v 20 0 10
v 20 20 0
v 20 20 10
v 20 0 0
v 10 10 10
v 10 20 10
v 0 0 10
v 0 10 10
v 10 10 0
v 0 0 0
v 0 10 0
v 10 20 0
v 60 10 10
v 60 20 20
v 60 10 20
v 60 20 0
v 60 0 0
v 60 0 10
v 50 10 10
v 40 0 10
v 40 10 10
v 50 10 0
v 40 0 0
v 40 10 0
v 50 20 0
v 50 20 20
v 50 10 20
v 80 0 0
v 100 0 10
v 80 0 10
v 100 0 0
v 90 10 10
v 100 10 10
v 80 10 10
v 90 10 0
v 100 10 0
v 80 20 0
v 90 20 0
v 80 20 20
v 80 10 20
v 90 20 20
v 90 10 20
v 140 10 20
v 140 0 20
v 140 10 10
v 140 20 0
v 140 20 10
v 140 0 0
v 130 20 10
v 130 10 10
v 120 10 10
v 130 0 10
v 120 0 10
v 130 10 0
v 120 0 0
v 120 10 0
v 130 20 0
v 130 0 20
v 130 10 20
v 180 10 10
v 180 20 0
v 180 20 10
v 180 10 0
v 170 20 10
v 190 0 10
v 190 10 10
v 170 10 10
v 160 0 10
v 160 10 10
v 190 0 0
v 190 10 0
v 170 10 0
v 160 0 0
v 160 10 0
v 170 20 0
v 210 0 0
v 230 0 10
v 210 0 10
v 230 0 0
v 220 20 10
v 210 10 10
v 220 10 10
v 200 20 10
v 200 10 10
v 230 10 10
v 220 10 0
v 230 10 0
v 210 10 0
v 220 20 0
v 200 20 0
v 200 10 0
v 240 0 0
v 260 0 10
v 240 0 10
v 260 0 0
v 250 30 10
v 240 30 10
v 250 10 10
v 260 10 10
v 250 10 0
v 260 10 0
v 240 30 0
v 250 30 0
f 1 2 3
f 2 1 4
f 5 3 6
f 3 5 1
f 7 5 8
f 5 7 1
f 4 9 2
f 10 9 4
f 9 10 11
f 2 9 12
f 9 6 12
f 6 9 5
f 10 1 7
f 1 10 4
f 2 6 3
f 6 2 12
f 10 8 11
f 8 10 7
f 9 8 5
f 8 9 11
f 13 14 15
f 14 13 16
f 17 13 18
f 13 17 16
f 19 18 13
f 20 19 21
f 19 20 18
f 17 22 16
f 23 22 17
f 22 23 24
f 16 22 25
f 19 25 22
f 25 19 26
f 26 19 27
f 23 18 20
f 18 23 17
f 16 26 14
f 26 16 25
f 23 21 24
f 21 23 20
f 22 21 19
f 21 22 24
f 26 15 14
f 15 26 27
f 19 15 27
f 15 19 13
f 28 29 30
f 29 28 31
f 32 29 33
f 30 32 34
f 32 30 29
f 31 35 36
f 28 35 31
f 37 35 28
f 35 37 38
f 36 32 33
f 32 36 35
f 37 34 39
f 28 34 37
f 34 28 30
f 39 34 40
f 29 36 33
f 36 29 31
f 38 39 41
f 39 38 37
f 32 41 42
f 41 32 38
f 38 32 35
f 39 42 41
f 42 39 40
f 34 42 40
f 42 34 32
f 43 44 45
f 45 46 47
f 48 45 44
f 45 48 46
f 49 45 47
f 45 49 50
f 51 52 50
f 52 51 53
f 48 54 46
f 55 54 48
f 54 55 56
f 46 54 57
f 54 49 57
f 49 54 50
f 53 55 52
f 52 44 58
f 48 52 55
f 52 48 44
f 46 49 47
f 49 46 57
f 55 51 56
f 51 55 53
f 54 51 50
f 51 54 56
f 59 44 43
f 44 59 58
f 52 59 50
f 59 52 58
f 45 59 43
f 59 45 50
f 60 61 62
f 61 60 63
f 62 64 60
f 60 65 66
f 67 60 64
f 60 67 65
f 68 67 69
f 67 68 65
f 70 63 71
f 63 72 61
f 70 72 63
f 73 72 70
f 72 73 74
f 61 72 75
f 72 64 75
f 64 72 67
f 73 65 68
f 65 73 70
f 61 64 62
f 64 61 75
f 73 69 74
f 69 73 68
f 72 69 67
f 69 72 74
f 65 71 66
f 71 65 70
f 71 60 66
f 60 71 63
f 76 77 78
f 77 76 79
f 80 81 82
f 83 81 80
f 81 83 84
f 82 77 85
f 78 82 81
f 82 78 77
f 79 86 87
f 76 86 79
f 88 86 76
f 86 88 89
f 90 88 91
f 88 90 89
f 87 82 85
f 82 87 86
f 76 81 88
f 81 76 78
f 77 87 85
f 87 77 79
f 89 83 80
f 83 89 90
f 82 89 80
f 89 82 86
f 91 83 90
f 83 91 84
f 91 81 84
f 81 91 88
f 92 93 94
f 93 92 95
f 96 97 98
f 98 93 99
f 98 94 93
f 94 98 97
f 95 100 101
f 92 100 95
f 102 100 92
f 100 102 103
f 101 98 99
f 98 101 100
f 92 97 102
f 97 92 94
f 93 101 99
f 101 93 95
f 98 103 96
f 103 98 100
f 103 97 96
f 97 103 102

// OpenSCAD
cs = 10; // TRY TO CHANGE ME!!!
xoffset = cs*4;

module triangle() {
    translate([cs, 0, 0])     cube(cs);
    translate([cs, cs, 0])     cube(cs);
    cube(cs);
}

triangle();

translate([xoffset, 0, 0]) {
    triangle();
    translate([cs, cs, cs])     cube(cs);
}

translate([xoffset*2, 0, 0]) {
    rotate([0, 0, -90]) translate([-cs*2, 0, 0]) triangle();
    translate([0, cs, cs])     cube(cs);
}

translate([xoffset*3, 0, 0]) {
    triangle();
    translate([cs, 0, cs])     cube(cs);
}

translate([xoffset*4, 0, 0]) {
    triangle();
    translate([cs*2, 0, 0])     cube(cs);
}

translate([xoffset*5, 0, 0]) {
    rotate([0, 0, -90]) translate([-cs*2, cs, 0]) triangle();
    translate([0, cs, 0])     cube(cs);
}

translate([xoffset*6, 0, 0]) {
    rotate([0, 0, -90]) translate([-cs*2, 0, 0]) triangle();
    translate([0, cs*2, 0])     cube(cs);
}
